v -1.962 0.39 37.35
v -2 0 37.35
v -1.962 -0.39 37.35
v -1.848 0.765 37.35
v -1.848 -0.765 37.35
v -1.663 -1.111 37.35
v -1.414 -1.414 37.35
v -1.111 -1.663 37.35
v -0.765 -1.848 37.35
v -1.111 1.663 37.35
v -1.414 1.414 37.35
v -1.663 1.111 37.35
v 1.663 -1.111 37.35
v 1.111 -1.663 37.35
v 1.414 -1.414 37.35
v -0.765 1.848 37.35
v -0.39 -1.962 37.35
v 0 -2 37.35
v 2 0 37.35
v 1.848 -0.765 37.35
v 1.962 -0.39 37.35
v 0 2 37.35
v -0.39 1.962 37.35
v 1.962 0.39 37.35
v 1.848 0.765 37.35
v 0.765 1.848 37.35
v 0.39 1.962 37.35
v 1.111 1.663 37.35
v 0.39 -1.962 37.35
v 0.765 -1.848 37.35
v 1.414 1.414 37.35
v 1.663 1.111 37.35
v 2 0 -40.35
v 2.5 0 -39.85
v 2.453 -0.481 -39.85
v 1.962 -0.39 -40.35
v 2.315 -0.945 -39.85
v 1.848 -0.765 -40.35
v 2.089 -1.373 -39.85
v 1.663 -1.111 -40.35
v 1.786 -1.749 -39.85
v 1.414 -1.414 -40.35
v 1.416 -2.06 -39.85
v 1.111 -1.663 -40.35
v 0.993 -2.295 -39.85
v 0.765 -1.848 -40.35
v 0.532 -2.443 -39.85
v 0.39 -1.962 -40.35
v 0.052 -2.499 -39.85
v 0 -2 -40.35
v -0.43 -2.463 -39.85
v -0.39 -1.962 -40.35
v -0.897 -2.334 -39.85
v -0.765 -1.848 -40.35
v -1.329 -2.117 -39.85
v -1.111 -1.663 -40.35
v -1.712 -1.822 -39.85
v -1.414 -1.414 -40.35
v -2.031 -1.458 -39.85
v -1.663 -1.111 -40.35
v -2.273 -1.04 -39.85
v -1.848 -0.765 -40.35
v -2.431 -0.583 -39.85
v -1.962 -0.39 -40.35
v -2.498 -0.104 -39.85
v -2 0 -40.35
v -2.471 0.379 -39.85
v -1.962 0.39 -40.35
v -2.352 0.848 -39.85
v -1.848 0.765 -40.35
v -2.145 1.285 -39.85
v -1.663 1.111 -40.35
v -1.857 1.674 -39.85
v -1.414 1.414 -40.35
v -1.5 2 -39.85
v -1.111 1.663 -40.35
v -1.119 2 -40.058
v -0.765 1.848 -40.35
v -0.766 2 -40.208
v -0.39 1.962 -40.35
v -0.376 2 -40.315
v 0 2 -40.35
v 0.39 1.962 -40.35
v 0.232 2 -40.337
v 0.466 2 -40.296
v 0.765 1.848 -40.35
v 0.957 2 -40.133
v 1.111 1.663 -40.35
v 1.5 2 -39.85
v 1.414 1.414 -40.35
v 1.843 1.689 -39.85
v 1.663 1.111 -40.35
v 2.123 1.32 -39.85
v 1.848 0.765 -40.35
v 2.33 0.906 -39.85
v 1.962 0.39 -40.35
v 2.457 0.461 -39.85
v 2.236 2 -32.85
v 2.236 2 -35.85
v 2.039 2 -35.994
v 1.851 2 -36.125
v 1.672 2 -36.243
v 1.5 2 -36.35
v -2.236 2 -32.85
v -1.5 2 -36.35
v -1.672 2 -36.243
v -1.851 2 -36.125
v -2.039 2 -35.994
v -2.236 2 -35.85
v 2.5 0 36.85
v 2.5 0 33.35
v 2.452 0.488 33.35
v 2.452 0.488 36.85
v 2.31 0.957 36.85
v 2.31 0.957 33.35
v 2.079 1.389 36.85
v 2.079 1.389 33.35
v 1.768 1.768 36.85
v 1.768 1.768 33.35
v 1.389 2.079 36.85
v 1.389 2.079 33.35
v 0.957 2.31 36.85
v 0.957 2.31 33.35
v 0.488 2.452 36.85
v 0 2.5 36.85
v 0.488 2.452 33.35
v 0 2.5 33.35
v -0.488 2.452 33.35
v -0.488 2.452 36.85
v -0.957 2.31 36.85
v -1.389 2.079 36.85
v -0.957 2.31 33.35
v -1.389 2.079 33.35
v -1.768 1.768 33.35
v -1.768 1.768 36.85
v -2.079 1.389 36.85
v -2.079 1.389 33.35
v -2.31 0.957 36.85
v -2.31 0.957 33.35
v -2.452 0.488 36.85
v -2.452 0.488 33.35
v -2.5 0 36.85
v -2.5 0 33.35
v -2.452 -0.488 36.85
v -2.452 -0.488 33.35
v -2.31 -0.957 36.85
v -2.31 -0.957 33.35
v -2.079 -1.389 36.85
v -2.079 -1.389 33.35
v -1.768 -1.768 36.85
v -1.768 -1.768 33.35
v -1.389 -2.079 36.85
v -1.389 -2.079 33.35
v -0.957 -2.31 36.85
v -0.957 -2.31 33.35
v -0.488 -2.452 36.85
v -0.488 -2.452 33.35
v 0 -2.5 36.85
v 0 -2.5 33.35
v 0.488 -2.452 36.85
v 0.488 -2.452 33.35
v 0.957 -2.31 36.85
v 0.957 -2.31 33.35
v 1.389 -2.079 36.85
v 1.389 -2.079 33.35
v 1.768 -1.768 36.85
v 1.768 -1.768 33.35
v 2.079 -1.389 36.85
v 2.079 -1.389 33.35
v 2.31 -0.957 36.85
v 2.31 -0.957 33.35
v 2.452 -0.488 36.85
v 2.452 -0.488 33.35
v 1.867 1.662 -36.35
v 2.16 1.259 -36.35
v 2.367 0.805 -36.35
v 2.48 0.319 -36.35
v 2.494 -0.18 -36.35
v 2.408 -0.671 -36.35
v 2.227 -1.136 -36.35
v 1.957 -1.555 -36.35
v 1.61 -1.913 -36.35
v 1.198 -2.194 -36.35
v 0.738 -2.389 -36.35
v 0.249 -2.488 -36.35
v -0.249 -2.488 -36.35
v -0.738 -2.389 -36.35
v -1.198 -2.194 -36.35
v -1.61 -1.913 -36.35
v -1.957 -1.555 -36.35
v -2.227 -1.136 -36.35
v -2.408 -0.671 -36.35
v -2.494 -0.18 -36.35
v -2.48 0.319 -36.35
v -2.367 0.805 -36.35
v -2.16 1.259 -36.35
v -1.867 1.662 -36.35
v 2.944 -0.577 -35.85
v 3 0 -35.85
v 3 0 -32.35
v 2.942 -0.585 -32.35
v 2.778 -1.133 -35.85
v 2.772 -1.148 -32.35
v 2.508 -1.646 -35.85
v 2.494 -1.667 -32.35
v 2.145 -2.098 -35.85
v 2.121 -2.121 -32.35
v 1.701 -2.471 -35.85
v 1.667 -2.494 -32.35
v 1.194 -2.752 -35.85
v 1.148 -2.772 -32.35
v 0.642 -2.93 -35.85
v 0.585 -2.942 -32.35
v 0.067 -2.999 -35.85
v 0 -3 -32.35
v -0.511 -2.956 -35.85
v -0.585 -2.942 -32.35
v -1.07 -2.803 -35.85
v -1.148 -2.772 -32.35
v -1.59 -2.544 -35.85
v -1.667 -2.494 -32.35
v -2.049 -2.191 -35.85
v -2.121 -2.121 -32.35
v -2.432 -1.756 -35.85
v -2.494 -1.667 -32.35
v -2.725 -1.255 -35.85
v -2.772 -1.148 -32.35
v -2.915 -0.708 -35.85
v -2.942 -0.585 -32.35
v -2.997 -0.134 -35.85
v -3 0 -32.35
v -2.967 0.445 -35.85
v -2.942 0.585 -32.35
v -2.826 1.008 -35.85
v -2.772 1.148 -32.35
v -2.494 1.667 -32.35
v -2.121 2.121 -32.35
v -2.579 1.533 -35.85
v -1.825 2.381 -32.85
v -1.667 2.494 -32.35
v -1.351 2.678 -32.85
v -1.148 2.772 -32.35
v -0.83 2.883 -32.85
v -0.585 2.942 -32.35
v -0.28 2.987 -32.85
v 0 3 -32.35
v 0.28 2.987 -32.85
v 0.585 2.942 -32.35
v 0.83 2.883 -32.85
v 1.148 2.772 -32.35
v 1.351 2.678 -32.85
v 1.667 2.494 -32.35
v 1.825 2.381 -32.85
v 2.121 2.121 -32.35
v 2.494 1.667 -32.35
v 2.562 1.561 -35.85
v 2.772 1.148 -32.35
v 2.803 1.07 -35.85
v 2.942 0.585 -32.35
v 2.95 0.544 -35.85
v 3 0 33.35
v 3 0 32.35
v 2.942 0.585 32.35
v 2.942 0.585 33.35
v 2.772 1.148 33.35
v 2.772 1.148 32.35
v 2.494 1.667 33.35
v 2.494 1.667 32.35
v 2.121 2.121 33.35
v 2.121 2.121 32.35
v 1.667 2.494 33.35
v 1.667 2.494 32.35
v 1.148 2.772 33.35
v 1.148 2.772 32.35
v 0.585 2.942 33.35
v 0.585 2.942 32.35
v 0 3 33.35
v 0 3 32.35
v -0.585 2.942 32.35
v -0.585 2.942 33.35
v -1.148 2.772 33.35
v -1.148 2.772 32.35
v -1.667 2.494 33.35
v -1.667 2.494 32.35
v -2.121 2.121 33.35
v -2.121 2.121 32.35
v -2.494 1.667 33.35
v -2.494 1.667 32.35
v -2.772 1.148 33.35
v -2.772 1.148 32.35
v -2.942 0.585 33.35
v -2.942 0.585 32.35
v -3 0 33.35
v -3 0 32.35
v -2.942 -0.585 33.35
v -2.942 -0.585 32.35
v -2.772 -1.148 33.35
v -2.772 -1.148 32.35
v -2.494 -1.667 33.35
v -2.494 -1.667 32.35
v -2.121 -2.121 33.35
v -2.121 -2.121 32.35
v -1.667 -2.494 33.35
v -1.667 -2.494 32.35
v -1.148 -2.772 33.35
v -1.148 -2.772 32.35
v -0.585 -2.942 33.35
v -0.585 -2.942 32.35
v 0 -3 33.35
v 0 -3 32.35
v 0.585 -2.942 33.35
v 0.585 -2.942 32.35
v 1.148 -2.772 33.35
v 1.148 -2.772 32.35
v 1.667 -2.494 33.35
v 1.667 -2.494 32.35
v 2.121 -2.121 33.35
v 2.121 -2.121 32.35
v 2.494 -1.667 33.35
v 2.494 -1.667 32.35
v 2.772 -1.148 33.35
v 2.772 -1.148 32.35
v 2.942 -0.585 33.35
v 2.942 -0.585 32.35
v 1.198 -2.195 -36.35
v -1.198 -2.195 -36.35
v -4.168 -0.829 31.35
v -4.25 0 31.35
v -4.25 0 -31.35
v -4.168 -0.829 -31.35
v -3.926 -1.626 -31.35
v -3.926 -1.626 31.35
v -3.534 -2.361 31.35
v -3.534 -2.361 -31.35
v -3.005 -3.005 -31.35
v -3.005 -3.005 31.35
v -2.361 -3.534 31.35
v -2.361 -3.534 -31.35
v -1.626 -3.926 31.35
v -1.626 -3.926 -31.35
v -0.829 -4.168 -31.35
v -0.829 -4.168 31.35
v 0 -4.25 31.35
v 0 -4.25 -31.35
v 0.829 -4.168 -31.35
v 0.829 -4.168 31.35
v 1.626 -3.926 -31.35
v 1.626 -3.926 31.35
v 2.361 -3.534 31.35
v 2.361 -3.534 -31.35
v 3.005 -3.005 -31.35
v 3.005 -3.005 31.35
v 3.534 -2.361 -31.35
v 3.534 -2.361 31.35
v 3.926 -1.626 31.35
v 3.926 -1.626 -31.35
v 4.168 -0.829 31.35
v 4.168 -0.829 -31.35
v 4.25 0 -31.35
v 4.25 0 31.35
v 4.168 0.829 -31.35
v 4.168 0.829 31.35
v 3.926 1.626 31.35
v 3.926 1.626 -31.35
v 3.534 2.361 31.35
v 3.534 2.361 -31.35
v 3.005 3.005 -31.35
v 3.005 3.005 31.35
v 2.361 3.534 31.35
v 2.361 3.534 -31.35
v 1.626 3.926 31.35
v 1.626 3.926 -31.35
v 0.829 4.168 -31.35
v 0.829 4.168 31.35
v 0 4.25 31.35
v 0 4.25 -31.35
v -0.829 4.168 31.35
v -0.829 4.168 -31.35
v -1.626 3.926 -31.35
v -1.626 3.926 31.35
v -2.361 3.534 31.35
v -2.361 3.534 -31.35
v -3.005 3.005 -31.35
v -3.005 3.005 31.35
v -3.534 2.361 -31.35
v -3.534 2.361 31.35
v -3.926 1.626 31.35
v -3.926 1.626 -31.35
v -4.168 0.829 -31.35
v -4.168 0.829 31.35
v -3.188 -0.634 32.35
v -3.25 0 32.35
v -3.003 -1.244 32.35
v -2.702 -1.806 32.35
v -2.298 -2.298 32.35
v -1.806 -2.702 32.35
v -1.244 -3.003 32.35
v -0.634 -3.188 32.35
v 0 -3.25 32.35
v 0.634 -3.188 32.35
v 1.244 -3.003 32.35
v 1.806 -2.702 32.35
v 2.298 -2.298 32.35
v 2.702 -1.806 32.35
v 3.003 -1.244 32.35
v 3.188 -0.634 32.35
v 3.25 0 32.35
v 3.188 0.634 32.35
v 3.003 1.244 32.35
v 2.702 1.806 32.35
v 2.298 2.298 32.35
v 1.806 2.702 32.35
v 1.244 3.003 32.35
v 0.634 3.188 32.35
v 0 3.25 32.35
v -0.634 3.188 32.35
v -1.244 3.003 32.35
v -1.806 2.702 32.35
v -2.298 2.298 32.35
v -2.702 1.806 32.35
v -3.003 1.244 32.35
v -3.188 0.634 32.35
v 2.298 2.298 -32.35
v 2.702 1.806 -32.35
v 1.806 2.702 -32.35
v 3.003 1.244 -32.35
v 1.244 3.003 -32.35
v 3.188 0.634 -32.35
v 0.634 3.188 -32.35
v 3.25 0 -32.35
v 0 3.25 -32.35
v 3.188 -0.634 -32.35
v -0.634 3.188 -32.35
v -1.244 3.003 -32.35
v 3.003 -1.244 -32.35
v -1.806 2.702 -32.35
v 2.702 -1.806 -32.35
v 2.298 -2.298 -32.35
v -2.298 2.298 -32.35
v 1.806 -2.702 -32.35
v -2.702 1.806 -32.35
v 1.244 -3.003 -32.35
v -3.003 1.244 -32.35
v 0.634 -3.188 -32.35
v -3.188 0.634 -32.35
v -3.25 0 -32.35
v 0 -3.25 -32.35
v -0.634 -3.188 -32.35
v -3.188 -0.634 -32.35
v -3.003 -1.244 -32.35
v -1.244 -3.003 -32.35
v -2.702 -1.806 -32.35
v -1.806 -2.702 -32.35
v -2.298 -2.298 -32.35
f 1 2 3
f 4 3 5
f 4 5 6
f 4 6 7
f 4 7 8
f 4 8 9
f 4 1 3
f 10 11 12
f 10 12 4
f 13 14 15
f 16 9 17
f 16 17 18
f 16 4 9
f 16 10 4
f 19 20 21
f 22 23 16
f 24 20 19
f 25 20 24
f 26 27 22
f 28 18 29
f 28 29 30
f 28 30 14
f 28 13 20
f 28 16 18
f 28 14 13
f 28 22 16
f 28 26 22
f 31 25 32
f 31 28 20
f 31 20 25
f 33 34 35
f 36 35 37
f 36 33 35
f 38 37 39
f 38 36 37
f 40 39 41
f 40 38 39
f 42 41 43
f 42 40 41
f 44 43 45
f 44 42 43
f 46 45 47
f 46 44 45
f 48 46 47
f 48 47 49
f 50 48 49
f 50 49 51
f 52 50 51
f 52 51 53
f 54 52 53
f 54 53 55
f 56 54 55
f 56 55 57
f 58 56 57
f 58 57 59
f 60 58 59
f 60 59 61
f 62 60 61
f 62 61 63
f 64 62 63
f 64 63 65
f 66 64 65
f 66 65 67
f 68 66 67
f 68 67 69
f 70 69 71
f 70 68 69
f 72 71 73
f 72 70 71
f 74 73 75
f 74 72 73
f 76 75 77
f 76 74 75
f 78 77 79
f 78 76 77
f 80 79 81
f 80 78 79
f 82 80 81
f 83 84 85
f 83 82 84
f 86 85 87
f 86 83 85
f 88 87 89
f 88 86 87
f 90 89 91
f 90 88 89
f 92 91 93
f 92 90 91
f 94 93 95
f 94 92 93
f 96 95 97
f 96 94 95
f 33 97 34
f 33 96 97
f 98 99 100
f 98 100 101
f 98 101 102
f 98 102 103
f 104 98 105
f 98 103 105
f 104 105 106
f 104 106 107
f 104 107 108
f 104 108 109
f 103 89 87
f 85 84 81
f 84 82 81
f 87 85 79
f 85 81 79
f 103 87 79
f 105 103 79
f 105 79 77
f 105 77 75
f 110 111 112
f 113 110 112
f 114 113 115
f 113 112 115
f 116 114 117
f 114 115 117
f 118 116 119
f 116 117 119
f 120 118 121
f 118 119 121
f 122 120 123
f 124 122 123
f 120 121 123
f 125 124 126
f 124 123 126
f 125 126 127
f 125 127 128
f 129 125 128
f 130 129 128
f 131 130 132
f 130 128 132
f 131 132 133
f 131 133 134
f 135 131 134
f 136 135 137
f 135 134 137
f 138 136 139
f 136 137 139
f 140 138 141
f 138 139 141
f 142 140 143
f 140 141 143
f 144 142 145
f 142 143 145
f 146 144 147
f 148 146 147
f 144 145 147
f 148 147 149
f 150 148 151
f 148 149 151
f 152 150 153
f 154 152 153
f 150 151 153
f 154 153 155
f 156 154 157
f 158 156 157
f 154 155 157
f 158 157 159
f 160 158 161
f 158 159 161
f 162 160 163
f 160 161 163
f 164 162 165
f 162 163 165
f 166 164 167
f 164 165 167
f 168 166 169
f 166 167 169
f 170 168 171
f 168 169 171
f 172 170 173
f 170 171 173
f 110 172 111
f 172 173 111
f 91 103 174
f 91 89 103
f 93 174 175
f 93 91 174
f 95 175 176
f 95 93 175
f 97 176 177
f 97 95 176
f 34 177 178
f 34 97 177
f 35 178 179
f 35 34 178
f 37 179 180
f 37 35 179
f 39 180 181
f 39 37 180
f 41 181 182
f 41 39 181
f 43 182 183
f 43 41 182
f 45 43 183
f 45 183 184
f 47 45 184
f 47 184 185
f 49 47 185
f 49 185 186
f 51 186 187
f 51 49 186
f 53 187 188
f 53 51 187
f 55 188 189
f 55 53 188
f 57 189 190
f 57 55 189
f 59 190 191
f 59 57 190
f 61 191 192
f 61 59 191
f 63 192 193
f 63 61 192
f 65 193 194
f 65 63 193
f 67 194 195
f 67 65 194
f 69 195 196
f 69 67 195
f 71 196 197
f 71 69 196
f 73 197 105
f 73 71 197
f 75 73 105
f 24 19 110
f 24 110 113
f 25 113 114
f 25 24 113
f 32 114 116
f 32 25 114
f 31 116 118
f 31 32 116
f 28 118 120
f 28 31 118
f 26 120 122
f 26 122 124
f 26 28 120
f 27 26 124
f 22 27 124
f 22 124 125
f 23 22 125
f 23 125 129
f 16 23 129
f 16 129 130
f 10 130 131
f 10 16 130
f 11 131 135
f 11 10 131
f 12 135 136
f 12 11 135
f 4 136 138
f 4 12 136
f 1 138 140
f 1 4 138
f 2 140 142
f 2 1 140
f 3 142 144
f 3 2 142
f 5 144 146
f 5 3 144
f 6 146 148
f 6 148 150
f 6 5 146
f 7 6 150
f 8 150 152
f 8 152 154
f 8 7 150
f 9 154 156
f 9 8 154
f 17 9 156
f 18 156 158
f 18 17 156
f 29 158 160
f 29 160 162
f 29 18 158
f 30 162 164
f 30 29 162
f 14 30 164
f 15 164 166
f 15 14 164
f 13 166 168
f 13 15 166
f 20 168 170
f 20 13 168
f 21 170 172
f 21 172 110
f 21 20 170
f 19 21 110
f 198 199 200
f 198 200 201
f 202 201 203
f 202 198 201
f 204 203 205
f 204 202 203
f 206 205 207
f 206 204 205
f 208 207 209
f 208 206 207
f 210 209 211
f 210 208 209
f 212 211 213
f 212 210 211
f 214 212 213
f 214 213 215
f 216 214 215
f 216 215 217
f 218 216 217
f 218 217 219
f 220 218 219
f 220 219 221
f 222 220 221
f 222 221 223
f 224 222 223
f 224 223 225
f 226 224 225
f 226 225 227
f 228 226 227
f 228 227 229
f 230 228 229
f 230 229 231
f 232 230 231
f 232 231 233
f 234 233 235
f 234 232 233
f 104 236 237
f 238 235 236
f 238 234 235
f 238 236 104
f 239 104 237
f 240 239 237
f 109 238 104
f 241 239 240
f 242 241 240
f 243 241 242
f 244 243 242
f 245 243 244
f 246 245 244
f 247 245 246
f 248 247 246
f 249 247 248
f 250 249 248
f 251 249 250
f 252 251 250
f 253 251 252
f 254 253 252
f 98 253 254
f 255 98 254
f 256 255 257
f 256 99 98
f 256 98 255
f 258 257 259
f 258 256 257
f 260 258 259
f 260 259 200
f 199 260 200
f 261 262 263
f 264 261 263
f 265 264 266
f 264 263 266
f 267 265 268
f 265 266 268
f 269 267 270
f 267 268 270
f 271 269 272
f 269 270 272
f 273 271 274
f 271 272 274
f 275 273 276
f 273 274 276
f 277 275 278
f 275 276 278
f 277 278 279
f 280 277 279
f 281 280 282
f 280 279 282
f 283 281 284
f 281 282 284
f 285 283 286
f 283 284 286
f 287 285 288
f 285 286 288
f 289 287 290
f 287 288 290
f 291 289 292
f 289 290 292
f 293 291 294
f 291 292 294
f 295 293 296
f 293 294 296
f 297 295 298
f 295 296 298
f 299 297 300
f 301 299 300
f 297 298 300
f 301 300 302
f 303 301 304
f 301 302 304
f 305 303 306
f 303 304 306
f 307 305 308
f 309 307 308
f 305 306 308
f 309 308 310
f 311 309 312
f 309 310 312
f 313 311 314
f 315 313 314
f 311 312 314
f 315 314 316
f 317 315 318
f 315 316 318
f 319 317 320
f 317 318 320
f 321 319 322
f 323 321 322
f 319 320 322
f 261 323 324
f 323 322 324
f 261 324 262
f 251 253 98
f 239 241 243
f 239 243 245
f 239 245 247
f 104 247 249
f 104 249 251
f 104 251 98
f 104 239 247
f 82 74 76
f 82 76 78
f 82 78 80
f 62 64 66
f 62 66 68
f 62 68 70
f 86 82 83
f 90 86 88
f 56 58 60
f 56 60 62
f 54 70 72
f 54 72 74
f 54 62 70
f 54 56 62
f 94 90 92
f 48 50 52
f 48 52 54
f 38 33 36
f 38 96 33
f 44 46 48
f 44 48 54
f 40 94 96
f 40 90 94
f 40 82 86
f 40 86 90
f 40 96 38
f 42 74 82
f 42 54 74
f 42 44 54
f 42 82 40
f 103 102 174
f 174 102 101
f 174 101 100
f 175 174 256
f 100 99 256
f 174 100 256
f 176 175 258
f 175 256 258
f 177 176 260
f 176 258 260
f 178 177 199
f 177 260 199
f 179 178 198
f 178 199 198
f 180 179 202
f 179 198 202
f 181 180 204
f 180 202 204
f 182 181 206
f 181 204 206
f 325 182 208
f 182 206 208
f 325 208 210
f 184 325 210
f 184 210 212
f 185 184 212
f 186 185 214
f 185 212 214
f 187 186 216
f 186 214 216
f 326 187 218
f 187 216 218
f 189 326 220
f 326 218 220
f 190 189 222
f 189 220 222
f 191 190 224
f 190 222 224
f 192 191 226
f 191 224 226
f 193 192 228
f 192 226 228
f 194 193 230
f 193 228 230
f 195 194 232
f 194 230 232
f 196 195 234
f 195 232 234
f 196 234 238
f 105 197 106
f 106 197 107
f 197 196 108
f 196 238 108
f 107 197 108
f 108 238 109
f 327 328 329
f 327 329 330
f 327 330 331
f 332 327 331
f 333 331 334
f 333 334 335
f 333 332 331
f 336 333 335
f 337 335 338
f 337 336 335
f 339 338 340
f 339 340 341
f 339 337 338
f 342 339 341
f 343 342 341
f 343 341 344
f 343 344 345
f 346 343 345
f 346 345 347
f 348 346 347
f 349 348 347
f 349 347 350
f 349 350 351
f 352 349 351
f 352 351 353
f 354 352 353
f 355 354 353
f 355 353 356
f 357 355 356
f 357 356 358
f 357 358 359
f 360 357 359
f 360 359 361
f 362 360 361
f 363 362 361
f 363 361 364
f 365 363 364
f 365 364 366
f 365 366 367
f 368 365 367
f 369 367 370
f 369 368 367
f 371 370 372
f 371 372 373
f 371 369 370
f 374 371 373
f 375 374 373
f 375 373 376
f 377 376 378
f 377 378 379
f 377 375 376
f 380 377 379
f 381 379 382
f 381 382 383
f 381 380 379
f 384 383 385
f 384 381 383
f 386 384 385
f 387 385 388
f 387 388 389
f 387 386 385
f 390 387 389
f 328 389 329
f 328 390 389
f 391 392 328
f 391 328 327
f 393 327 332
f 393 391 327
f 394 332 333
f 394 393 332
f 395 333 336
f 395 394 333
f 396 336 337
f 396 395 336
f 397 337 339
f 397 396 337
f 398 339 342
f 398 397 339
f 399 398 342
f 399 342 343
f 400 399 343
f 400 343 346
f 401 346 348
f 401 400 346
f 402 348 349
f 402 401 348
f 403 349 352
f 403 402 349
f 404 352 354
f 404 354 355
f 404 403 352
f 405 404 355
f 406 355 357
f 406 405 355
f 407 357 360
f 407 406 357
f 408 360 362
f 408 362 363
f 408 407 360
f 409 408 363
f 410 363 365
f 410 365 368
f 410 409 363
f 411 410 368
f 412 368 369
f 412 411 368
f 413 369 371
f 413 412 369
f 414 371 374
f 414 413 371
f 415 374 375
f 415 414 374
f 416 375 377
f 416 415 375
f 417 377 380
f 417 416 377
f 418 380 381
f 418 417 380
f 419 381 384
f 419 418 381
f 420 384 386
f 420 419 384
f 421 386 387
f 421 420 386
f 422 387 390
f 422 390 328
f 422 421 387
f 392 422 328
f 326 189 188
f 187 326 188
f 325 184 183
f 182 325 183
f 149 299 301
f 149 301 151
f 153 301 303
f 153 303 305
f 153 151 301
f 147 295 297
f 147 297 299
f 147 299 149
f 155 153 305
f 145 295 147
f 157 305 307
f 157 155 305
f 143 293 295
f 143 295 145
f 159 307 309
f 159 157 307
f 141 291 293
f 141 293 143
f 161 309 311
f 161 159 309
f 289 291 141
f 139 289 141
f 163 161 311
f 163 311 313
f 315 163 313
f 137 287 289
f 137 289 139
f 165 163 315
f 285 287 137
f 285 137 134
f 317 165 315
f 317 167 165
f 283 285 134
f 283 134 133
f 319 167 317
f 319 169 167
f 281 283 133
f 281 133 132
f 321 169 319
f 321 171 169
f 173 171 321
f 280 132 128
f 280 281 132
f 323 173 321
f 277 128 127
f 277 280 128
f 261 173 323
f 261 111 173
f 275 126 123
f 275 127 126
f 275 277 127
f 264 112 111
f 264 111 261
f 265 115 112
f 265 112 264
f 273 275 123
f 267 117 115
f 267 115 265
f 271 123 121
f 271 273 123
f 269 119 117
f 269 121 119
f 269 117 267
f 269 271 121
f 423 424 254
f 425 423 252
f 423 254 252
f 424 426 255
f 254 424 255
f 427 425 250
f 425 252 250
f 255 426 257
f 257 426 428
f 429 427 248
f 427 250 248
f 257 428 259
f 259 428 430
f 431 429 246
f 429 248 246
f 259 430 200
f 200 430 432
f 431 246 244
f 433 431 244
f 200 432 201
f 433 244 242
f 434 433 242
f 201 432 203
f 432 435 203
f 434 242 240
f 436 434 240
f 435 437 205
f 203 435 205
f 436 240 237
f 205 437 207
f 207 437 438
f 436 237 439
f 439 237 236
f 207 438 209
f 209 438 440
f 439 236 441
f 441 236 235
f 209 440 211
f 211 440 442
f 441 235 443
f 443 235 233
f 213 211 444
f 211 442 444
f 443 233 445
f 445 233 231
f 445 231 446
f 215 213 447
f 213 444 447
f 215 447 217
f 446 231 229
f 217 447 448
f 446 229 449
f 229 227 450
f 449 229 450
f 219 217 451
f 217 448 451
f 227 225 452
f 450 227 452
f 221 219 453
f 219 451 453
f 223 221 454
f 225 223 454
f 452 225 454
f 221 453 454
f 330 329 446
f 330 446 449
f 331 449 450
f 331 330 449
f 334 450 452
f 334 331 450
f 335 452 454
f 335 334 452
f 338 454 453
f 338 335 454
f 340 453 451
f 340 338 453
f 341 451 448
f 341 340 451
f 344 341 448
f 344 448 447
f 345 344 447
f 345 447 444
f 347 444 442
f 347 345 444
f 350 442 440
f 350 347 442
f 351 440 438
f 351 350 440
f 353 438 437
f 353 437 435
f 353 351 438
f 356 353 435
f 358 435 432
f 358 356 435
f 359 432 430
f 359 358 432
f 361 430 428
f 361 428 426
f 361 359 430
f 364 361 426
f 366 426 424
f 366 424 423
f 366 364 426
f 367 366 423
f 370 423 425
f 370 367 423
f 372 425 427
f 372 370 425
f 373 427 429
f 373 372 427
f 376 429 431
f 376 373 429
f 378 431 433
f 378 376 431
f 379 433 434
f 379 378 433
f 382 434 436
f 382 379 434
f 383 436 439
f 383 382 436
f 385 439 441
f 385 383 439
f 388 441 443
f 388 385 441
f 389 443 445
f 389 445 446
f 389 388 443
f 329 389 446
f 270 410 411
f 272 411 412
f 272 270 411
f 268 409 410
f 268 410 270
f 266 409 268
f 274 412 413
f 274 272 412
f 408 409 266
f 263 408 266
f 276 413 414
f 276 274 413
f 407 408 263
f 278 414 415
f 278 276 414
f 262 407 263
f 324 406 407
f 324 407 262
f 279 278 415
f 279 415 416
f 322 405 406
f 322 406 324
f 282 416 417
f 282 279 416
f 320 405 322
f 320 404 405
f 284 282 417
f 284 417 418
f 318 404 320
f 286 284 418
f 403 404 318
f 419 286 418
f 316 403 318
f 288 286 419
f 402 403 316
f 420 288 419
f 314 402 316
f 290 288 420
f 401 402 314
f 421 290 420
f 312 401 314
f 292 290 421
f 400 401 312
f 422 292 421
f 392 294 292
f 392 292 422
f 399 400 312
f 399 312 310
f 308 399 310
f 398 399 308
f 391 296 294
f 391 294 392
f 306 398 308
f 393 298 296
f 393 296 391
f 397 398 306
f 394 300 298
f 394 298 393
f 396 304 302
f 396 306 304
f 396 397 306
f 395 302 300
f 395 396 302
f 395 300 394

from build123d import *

# Parameters (mm, degrees)
SKETCH_1_R          = 4.25
EXTRUDE_1_DEPTH     = 32.35
SKETCH_2_R          = 3
EXTRUDE_2_DEPTH     = 1
SKETCH_3_R          = 2.5
EXTRUDE_3_DEPTH     = 4
EXTRUDE_START       = 4
SKETCH_4_R          = 3
EXTRUDE_4_DEPTH     = 4
SKETCH_5_R          = 2.5
EXTRUDE_5_DEPTH     = 4
CHAMFER_1_SIZE      = 0.5
CHAMFER_2_SIZE      = 0.5
SKETCH_6_W          = 6
SKETCH_6_H          = 3
CUT_EXTRUDE_6_DEPTH = 7.5
CHAMFER1_SIZE       = 1


with BuildPart() as part:
    # 草图1 → 拉伸1 (new, symmetric)
    with BuildSketch(Plane.XY):
        with Locations(Location((0, 0, 0), (0, 0, 180))):
            Circle(SKETCH_1_R)
    extrude(amount=EXTRUDE_1_DEPTH, both=True)

    # 草图2 → 拉伸2 (add)
    with BuildSketch(Plane.XY.offset(32.35)):
        Circle(SKETCH_2_R)
    extrude(amount=EXTRUDE_2_DEPTH)

    # 草图3 → 拉伸3 (add)
    with BuildSketch(Plane.XY.offset(33.35)):
        Circle(SKETCH_3_R)
    extrude(amount=EXTRUDE_3_DEPTH)

    # 草图4 → 拉伸4 (add)
    with BuildSketch(Plane(origin=(0, 0, -32.35), x_dir=(-1, 0, 0), z_dir=(0, 0, -1)).offset(EXTRUDE_START)):
        with Locations(Location((0, 0, 0), (0, 0, 180))):
            Circle(SKETCH_4_R)
    extrude(amount=-EXTRUDE_4_DEPTH)

    # 草图5 → 拉伸5 (add)
    with BuildSketch(Plane(origin=(0, 0, -36.35), x_dir=(-1, 0, 0), z_dir=(0, 0, -1)).offset(EXTRUDE_START)):
        with Locations(Location((0, 0, 0), (0, 0, 180))):
            Circle(SKETCH_5_R)
    extrude(amount=-EXTRUDE_5_DEPTH)

    # 倒角1
    chamfer_1_edges = [part.edges().sort_by_distance(p)[0] for p in [
        (-2.5, 0, 37.35),
        (-2.5, 0, -40.35),
    ]]
    chamfer(chamfer_1_edges, length=CHAMFER_1_SIZE)

    # 倒角2
    chamfer_2_edges = [part.edges().sort_by_distance(p)[0] for p in [
        (-3, 0, -36.35),
    ]]
    chamfer(chamfer_2_edges, length=CHAMFER_2_SIZE - 0.0001)  # a hair under: the kernel refuses the full size

    # 草图6 → 拉伸6 (cut)
    with BuildSketch(Plane(origin=(0, 0, -40.35), x_dir=(-1, 0, 0), z_dir=(0, 0, -1))):
        with Locations((0, 3.5)):
            Rectangle(SKETCH_6_W, SKETCH_6_H)
    extrude(amount=-CUT_EXTRUDE_6_DEPTH, mode=Mode.SUBTRACT)

    # Chamfer1
    chamfer1_edges = [part.edges().sort_by_distance(p)[0] for p in [
        (4.25, 0, -32.35),
        (4.25, 0, 32.35),
    ]]
    chamfer(chamfer1_edges, length=CHAMFER1_SIZE)


solid = part.part
